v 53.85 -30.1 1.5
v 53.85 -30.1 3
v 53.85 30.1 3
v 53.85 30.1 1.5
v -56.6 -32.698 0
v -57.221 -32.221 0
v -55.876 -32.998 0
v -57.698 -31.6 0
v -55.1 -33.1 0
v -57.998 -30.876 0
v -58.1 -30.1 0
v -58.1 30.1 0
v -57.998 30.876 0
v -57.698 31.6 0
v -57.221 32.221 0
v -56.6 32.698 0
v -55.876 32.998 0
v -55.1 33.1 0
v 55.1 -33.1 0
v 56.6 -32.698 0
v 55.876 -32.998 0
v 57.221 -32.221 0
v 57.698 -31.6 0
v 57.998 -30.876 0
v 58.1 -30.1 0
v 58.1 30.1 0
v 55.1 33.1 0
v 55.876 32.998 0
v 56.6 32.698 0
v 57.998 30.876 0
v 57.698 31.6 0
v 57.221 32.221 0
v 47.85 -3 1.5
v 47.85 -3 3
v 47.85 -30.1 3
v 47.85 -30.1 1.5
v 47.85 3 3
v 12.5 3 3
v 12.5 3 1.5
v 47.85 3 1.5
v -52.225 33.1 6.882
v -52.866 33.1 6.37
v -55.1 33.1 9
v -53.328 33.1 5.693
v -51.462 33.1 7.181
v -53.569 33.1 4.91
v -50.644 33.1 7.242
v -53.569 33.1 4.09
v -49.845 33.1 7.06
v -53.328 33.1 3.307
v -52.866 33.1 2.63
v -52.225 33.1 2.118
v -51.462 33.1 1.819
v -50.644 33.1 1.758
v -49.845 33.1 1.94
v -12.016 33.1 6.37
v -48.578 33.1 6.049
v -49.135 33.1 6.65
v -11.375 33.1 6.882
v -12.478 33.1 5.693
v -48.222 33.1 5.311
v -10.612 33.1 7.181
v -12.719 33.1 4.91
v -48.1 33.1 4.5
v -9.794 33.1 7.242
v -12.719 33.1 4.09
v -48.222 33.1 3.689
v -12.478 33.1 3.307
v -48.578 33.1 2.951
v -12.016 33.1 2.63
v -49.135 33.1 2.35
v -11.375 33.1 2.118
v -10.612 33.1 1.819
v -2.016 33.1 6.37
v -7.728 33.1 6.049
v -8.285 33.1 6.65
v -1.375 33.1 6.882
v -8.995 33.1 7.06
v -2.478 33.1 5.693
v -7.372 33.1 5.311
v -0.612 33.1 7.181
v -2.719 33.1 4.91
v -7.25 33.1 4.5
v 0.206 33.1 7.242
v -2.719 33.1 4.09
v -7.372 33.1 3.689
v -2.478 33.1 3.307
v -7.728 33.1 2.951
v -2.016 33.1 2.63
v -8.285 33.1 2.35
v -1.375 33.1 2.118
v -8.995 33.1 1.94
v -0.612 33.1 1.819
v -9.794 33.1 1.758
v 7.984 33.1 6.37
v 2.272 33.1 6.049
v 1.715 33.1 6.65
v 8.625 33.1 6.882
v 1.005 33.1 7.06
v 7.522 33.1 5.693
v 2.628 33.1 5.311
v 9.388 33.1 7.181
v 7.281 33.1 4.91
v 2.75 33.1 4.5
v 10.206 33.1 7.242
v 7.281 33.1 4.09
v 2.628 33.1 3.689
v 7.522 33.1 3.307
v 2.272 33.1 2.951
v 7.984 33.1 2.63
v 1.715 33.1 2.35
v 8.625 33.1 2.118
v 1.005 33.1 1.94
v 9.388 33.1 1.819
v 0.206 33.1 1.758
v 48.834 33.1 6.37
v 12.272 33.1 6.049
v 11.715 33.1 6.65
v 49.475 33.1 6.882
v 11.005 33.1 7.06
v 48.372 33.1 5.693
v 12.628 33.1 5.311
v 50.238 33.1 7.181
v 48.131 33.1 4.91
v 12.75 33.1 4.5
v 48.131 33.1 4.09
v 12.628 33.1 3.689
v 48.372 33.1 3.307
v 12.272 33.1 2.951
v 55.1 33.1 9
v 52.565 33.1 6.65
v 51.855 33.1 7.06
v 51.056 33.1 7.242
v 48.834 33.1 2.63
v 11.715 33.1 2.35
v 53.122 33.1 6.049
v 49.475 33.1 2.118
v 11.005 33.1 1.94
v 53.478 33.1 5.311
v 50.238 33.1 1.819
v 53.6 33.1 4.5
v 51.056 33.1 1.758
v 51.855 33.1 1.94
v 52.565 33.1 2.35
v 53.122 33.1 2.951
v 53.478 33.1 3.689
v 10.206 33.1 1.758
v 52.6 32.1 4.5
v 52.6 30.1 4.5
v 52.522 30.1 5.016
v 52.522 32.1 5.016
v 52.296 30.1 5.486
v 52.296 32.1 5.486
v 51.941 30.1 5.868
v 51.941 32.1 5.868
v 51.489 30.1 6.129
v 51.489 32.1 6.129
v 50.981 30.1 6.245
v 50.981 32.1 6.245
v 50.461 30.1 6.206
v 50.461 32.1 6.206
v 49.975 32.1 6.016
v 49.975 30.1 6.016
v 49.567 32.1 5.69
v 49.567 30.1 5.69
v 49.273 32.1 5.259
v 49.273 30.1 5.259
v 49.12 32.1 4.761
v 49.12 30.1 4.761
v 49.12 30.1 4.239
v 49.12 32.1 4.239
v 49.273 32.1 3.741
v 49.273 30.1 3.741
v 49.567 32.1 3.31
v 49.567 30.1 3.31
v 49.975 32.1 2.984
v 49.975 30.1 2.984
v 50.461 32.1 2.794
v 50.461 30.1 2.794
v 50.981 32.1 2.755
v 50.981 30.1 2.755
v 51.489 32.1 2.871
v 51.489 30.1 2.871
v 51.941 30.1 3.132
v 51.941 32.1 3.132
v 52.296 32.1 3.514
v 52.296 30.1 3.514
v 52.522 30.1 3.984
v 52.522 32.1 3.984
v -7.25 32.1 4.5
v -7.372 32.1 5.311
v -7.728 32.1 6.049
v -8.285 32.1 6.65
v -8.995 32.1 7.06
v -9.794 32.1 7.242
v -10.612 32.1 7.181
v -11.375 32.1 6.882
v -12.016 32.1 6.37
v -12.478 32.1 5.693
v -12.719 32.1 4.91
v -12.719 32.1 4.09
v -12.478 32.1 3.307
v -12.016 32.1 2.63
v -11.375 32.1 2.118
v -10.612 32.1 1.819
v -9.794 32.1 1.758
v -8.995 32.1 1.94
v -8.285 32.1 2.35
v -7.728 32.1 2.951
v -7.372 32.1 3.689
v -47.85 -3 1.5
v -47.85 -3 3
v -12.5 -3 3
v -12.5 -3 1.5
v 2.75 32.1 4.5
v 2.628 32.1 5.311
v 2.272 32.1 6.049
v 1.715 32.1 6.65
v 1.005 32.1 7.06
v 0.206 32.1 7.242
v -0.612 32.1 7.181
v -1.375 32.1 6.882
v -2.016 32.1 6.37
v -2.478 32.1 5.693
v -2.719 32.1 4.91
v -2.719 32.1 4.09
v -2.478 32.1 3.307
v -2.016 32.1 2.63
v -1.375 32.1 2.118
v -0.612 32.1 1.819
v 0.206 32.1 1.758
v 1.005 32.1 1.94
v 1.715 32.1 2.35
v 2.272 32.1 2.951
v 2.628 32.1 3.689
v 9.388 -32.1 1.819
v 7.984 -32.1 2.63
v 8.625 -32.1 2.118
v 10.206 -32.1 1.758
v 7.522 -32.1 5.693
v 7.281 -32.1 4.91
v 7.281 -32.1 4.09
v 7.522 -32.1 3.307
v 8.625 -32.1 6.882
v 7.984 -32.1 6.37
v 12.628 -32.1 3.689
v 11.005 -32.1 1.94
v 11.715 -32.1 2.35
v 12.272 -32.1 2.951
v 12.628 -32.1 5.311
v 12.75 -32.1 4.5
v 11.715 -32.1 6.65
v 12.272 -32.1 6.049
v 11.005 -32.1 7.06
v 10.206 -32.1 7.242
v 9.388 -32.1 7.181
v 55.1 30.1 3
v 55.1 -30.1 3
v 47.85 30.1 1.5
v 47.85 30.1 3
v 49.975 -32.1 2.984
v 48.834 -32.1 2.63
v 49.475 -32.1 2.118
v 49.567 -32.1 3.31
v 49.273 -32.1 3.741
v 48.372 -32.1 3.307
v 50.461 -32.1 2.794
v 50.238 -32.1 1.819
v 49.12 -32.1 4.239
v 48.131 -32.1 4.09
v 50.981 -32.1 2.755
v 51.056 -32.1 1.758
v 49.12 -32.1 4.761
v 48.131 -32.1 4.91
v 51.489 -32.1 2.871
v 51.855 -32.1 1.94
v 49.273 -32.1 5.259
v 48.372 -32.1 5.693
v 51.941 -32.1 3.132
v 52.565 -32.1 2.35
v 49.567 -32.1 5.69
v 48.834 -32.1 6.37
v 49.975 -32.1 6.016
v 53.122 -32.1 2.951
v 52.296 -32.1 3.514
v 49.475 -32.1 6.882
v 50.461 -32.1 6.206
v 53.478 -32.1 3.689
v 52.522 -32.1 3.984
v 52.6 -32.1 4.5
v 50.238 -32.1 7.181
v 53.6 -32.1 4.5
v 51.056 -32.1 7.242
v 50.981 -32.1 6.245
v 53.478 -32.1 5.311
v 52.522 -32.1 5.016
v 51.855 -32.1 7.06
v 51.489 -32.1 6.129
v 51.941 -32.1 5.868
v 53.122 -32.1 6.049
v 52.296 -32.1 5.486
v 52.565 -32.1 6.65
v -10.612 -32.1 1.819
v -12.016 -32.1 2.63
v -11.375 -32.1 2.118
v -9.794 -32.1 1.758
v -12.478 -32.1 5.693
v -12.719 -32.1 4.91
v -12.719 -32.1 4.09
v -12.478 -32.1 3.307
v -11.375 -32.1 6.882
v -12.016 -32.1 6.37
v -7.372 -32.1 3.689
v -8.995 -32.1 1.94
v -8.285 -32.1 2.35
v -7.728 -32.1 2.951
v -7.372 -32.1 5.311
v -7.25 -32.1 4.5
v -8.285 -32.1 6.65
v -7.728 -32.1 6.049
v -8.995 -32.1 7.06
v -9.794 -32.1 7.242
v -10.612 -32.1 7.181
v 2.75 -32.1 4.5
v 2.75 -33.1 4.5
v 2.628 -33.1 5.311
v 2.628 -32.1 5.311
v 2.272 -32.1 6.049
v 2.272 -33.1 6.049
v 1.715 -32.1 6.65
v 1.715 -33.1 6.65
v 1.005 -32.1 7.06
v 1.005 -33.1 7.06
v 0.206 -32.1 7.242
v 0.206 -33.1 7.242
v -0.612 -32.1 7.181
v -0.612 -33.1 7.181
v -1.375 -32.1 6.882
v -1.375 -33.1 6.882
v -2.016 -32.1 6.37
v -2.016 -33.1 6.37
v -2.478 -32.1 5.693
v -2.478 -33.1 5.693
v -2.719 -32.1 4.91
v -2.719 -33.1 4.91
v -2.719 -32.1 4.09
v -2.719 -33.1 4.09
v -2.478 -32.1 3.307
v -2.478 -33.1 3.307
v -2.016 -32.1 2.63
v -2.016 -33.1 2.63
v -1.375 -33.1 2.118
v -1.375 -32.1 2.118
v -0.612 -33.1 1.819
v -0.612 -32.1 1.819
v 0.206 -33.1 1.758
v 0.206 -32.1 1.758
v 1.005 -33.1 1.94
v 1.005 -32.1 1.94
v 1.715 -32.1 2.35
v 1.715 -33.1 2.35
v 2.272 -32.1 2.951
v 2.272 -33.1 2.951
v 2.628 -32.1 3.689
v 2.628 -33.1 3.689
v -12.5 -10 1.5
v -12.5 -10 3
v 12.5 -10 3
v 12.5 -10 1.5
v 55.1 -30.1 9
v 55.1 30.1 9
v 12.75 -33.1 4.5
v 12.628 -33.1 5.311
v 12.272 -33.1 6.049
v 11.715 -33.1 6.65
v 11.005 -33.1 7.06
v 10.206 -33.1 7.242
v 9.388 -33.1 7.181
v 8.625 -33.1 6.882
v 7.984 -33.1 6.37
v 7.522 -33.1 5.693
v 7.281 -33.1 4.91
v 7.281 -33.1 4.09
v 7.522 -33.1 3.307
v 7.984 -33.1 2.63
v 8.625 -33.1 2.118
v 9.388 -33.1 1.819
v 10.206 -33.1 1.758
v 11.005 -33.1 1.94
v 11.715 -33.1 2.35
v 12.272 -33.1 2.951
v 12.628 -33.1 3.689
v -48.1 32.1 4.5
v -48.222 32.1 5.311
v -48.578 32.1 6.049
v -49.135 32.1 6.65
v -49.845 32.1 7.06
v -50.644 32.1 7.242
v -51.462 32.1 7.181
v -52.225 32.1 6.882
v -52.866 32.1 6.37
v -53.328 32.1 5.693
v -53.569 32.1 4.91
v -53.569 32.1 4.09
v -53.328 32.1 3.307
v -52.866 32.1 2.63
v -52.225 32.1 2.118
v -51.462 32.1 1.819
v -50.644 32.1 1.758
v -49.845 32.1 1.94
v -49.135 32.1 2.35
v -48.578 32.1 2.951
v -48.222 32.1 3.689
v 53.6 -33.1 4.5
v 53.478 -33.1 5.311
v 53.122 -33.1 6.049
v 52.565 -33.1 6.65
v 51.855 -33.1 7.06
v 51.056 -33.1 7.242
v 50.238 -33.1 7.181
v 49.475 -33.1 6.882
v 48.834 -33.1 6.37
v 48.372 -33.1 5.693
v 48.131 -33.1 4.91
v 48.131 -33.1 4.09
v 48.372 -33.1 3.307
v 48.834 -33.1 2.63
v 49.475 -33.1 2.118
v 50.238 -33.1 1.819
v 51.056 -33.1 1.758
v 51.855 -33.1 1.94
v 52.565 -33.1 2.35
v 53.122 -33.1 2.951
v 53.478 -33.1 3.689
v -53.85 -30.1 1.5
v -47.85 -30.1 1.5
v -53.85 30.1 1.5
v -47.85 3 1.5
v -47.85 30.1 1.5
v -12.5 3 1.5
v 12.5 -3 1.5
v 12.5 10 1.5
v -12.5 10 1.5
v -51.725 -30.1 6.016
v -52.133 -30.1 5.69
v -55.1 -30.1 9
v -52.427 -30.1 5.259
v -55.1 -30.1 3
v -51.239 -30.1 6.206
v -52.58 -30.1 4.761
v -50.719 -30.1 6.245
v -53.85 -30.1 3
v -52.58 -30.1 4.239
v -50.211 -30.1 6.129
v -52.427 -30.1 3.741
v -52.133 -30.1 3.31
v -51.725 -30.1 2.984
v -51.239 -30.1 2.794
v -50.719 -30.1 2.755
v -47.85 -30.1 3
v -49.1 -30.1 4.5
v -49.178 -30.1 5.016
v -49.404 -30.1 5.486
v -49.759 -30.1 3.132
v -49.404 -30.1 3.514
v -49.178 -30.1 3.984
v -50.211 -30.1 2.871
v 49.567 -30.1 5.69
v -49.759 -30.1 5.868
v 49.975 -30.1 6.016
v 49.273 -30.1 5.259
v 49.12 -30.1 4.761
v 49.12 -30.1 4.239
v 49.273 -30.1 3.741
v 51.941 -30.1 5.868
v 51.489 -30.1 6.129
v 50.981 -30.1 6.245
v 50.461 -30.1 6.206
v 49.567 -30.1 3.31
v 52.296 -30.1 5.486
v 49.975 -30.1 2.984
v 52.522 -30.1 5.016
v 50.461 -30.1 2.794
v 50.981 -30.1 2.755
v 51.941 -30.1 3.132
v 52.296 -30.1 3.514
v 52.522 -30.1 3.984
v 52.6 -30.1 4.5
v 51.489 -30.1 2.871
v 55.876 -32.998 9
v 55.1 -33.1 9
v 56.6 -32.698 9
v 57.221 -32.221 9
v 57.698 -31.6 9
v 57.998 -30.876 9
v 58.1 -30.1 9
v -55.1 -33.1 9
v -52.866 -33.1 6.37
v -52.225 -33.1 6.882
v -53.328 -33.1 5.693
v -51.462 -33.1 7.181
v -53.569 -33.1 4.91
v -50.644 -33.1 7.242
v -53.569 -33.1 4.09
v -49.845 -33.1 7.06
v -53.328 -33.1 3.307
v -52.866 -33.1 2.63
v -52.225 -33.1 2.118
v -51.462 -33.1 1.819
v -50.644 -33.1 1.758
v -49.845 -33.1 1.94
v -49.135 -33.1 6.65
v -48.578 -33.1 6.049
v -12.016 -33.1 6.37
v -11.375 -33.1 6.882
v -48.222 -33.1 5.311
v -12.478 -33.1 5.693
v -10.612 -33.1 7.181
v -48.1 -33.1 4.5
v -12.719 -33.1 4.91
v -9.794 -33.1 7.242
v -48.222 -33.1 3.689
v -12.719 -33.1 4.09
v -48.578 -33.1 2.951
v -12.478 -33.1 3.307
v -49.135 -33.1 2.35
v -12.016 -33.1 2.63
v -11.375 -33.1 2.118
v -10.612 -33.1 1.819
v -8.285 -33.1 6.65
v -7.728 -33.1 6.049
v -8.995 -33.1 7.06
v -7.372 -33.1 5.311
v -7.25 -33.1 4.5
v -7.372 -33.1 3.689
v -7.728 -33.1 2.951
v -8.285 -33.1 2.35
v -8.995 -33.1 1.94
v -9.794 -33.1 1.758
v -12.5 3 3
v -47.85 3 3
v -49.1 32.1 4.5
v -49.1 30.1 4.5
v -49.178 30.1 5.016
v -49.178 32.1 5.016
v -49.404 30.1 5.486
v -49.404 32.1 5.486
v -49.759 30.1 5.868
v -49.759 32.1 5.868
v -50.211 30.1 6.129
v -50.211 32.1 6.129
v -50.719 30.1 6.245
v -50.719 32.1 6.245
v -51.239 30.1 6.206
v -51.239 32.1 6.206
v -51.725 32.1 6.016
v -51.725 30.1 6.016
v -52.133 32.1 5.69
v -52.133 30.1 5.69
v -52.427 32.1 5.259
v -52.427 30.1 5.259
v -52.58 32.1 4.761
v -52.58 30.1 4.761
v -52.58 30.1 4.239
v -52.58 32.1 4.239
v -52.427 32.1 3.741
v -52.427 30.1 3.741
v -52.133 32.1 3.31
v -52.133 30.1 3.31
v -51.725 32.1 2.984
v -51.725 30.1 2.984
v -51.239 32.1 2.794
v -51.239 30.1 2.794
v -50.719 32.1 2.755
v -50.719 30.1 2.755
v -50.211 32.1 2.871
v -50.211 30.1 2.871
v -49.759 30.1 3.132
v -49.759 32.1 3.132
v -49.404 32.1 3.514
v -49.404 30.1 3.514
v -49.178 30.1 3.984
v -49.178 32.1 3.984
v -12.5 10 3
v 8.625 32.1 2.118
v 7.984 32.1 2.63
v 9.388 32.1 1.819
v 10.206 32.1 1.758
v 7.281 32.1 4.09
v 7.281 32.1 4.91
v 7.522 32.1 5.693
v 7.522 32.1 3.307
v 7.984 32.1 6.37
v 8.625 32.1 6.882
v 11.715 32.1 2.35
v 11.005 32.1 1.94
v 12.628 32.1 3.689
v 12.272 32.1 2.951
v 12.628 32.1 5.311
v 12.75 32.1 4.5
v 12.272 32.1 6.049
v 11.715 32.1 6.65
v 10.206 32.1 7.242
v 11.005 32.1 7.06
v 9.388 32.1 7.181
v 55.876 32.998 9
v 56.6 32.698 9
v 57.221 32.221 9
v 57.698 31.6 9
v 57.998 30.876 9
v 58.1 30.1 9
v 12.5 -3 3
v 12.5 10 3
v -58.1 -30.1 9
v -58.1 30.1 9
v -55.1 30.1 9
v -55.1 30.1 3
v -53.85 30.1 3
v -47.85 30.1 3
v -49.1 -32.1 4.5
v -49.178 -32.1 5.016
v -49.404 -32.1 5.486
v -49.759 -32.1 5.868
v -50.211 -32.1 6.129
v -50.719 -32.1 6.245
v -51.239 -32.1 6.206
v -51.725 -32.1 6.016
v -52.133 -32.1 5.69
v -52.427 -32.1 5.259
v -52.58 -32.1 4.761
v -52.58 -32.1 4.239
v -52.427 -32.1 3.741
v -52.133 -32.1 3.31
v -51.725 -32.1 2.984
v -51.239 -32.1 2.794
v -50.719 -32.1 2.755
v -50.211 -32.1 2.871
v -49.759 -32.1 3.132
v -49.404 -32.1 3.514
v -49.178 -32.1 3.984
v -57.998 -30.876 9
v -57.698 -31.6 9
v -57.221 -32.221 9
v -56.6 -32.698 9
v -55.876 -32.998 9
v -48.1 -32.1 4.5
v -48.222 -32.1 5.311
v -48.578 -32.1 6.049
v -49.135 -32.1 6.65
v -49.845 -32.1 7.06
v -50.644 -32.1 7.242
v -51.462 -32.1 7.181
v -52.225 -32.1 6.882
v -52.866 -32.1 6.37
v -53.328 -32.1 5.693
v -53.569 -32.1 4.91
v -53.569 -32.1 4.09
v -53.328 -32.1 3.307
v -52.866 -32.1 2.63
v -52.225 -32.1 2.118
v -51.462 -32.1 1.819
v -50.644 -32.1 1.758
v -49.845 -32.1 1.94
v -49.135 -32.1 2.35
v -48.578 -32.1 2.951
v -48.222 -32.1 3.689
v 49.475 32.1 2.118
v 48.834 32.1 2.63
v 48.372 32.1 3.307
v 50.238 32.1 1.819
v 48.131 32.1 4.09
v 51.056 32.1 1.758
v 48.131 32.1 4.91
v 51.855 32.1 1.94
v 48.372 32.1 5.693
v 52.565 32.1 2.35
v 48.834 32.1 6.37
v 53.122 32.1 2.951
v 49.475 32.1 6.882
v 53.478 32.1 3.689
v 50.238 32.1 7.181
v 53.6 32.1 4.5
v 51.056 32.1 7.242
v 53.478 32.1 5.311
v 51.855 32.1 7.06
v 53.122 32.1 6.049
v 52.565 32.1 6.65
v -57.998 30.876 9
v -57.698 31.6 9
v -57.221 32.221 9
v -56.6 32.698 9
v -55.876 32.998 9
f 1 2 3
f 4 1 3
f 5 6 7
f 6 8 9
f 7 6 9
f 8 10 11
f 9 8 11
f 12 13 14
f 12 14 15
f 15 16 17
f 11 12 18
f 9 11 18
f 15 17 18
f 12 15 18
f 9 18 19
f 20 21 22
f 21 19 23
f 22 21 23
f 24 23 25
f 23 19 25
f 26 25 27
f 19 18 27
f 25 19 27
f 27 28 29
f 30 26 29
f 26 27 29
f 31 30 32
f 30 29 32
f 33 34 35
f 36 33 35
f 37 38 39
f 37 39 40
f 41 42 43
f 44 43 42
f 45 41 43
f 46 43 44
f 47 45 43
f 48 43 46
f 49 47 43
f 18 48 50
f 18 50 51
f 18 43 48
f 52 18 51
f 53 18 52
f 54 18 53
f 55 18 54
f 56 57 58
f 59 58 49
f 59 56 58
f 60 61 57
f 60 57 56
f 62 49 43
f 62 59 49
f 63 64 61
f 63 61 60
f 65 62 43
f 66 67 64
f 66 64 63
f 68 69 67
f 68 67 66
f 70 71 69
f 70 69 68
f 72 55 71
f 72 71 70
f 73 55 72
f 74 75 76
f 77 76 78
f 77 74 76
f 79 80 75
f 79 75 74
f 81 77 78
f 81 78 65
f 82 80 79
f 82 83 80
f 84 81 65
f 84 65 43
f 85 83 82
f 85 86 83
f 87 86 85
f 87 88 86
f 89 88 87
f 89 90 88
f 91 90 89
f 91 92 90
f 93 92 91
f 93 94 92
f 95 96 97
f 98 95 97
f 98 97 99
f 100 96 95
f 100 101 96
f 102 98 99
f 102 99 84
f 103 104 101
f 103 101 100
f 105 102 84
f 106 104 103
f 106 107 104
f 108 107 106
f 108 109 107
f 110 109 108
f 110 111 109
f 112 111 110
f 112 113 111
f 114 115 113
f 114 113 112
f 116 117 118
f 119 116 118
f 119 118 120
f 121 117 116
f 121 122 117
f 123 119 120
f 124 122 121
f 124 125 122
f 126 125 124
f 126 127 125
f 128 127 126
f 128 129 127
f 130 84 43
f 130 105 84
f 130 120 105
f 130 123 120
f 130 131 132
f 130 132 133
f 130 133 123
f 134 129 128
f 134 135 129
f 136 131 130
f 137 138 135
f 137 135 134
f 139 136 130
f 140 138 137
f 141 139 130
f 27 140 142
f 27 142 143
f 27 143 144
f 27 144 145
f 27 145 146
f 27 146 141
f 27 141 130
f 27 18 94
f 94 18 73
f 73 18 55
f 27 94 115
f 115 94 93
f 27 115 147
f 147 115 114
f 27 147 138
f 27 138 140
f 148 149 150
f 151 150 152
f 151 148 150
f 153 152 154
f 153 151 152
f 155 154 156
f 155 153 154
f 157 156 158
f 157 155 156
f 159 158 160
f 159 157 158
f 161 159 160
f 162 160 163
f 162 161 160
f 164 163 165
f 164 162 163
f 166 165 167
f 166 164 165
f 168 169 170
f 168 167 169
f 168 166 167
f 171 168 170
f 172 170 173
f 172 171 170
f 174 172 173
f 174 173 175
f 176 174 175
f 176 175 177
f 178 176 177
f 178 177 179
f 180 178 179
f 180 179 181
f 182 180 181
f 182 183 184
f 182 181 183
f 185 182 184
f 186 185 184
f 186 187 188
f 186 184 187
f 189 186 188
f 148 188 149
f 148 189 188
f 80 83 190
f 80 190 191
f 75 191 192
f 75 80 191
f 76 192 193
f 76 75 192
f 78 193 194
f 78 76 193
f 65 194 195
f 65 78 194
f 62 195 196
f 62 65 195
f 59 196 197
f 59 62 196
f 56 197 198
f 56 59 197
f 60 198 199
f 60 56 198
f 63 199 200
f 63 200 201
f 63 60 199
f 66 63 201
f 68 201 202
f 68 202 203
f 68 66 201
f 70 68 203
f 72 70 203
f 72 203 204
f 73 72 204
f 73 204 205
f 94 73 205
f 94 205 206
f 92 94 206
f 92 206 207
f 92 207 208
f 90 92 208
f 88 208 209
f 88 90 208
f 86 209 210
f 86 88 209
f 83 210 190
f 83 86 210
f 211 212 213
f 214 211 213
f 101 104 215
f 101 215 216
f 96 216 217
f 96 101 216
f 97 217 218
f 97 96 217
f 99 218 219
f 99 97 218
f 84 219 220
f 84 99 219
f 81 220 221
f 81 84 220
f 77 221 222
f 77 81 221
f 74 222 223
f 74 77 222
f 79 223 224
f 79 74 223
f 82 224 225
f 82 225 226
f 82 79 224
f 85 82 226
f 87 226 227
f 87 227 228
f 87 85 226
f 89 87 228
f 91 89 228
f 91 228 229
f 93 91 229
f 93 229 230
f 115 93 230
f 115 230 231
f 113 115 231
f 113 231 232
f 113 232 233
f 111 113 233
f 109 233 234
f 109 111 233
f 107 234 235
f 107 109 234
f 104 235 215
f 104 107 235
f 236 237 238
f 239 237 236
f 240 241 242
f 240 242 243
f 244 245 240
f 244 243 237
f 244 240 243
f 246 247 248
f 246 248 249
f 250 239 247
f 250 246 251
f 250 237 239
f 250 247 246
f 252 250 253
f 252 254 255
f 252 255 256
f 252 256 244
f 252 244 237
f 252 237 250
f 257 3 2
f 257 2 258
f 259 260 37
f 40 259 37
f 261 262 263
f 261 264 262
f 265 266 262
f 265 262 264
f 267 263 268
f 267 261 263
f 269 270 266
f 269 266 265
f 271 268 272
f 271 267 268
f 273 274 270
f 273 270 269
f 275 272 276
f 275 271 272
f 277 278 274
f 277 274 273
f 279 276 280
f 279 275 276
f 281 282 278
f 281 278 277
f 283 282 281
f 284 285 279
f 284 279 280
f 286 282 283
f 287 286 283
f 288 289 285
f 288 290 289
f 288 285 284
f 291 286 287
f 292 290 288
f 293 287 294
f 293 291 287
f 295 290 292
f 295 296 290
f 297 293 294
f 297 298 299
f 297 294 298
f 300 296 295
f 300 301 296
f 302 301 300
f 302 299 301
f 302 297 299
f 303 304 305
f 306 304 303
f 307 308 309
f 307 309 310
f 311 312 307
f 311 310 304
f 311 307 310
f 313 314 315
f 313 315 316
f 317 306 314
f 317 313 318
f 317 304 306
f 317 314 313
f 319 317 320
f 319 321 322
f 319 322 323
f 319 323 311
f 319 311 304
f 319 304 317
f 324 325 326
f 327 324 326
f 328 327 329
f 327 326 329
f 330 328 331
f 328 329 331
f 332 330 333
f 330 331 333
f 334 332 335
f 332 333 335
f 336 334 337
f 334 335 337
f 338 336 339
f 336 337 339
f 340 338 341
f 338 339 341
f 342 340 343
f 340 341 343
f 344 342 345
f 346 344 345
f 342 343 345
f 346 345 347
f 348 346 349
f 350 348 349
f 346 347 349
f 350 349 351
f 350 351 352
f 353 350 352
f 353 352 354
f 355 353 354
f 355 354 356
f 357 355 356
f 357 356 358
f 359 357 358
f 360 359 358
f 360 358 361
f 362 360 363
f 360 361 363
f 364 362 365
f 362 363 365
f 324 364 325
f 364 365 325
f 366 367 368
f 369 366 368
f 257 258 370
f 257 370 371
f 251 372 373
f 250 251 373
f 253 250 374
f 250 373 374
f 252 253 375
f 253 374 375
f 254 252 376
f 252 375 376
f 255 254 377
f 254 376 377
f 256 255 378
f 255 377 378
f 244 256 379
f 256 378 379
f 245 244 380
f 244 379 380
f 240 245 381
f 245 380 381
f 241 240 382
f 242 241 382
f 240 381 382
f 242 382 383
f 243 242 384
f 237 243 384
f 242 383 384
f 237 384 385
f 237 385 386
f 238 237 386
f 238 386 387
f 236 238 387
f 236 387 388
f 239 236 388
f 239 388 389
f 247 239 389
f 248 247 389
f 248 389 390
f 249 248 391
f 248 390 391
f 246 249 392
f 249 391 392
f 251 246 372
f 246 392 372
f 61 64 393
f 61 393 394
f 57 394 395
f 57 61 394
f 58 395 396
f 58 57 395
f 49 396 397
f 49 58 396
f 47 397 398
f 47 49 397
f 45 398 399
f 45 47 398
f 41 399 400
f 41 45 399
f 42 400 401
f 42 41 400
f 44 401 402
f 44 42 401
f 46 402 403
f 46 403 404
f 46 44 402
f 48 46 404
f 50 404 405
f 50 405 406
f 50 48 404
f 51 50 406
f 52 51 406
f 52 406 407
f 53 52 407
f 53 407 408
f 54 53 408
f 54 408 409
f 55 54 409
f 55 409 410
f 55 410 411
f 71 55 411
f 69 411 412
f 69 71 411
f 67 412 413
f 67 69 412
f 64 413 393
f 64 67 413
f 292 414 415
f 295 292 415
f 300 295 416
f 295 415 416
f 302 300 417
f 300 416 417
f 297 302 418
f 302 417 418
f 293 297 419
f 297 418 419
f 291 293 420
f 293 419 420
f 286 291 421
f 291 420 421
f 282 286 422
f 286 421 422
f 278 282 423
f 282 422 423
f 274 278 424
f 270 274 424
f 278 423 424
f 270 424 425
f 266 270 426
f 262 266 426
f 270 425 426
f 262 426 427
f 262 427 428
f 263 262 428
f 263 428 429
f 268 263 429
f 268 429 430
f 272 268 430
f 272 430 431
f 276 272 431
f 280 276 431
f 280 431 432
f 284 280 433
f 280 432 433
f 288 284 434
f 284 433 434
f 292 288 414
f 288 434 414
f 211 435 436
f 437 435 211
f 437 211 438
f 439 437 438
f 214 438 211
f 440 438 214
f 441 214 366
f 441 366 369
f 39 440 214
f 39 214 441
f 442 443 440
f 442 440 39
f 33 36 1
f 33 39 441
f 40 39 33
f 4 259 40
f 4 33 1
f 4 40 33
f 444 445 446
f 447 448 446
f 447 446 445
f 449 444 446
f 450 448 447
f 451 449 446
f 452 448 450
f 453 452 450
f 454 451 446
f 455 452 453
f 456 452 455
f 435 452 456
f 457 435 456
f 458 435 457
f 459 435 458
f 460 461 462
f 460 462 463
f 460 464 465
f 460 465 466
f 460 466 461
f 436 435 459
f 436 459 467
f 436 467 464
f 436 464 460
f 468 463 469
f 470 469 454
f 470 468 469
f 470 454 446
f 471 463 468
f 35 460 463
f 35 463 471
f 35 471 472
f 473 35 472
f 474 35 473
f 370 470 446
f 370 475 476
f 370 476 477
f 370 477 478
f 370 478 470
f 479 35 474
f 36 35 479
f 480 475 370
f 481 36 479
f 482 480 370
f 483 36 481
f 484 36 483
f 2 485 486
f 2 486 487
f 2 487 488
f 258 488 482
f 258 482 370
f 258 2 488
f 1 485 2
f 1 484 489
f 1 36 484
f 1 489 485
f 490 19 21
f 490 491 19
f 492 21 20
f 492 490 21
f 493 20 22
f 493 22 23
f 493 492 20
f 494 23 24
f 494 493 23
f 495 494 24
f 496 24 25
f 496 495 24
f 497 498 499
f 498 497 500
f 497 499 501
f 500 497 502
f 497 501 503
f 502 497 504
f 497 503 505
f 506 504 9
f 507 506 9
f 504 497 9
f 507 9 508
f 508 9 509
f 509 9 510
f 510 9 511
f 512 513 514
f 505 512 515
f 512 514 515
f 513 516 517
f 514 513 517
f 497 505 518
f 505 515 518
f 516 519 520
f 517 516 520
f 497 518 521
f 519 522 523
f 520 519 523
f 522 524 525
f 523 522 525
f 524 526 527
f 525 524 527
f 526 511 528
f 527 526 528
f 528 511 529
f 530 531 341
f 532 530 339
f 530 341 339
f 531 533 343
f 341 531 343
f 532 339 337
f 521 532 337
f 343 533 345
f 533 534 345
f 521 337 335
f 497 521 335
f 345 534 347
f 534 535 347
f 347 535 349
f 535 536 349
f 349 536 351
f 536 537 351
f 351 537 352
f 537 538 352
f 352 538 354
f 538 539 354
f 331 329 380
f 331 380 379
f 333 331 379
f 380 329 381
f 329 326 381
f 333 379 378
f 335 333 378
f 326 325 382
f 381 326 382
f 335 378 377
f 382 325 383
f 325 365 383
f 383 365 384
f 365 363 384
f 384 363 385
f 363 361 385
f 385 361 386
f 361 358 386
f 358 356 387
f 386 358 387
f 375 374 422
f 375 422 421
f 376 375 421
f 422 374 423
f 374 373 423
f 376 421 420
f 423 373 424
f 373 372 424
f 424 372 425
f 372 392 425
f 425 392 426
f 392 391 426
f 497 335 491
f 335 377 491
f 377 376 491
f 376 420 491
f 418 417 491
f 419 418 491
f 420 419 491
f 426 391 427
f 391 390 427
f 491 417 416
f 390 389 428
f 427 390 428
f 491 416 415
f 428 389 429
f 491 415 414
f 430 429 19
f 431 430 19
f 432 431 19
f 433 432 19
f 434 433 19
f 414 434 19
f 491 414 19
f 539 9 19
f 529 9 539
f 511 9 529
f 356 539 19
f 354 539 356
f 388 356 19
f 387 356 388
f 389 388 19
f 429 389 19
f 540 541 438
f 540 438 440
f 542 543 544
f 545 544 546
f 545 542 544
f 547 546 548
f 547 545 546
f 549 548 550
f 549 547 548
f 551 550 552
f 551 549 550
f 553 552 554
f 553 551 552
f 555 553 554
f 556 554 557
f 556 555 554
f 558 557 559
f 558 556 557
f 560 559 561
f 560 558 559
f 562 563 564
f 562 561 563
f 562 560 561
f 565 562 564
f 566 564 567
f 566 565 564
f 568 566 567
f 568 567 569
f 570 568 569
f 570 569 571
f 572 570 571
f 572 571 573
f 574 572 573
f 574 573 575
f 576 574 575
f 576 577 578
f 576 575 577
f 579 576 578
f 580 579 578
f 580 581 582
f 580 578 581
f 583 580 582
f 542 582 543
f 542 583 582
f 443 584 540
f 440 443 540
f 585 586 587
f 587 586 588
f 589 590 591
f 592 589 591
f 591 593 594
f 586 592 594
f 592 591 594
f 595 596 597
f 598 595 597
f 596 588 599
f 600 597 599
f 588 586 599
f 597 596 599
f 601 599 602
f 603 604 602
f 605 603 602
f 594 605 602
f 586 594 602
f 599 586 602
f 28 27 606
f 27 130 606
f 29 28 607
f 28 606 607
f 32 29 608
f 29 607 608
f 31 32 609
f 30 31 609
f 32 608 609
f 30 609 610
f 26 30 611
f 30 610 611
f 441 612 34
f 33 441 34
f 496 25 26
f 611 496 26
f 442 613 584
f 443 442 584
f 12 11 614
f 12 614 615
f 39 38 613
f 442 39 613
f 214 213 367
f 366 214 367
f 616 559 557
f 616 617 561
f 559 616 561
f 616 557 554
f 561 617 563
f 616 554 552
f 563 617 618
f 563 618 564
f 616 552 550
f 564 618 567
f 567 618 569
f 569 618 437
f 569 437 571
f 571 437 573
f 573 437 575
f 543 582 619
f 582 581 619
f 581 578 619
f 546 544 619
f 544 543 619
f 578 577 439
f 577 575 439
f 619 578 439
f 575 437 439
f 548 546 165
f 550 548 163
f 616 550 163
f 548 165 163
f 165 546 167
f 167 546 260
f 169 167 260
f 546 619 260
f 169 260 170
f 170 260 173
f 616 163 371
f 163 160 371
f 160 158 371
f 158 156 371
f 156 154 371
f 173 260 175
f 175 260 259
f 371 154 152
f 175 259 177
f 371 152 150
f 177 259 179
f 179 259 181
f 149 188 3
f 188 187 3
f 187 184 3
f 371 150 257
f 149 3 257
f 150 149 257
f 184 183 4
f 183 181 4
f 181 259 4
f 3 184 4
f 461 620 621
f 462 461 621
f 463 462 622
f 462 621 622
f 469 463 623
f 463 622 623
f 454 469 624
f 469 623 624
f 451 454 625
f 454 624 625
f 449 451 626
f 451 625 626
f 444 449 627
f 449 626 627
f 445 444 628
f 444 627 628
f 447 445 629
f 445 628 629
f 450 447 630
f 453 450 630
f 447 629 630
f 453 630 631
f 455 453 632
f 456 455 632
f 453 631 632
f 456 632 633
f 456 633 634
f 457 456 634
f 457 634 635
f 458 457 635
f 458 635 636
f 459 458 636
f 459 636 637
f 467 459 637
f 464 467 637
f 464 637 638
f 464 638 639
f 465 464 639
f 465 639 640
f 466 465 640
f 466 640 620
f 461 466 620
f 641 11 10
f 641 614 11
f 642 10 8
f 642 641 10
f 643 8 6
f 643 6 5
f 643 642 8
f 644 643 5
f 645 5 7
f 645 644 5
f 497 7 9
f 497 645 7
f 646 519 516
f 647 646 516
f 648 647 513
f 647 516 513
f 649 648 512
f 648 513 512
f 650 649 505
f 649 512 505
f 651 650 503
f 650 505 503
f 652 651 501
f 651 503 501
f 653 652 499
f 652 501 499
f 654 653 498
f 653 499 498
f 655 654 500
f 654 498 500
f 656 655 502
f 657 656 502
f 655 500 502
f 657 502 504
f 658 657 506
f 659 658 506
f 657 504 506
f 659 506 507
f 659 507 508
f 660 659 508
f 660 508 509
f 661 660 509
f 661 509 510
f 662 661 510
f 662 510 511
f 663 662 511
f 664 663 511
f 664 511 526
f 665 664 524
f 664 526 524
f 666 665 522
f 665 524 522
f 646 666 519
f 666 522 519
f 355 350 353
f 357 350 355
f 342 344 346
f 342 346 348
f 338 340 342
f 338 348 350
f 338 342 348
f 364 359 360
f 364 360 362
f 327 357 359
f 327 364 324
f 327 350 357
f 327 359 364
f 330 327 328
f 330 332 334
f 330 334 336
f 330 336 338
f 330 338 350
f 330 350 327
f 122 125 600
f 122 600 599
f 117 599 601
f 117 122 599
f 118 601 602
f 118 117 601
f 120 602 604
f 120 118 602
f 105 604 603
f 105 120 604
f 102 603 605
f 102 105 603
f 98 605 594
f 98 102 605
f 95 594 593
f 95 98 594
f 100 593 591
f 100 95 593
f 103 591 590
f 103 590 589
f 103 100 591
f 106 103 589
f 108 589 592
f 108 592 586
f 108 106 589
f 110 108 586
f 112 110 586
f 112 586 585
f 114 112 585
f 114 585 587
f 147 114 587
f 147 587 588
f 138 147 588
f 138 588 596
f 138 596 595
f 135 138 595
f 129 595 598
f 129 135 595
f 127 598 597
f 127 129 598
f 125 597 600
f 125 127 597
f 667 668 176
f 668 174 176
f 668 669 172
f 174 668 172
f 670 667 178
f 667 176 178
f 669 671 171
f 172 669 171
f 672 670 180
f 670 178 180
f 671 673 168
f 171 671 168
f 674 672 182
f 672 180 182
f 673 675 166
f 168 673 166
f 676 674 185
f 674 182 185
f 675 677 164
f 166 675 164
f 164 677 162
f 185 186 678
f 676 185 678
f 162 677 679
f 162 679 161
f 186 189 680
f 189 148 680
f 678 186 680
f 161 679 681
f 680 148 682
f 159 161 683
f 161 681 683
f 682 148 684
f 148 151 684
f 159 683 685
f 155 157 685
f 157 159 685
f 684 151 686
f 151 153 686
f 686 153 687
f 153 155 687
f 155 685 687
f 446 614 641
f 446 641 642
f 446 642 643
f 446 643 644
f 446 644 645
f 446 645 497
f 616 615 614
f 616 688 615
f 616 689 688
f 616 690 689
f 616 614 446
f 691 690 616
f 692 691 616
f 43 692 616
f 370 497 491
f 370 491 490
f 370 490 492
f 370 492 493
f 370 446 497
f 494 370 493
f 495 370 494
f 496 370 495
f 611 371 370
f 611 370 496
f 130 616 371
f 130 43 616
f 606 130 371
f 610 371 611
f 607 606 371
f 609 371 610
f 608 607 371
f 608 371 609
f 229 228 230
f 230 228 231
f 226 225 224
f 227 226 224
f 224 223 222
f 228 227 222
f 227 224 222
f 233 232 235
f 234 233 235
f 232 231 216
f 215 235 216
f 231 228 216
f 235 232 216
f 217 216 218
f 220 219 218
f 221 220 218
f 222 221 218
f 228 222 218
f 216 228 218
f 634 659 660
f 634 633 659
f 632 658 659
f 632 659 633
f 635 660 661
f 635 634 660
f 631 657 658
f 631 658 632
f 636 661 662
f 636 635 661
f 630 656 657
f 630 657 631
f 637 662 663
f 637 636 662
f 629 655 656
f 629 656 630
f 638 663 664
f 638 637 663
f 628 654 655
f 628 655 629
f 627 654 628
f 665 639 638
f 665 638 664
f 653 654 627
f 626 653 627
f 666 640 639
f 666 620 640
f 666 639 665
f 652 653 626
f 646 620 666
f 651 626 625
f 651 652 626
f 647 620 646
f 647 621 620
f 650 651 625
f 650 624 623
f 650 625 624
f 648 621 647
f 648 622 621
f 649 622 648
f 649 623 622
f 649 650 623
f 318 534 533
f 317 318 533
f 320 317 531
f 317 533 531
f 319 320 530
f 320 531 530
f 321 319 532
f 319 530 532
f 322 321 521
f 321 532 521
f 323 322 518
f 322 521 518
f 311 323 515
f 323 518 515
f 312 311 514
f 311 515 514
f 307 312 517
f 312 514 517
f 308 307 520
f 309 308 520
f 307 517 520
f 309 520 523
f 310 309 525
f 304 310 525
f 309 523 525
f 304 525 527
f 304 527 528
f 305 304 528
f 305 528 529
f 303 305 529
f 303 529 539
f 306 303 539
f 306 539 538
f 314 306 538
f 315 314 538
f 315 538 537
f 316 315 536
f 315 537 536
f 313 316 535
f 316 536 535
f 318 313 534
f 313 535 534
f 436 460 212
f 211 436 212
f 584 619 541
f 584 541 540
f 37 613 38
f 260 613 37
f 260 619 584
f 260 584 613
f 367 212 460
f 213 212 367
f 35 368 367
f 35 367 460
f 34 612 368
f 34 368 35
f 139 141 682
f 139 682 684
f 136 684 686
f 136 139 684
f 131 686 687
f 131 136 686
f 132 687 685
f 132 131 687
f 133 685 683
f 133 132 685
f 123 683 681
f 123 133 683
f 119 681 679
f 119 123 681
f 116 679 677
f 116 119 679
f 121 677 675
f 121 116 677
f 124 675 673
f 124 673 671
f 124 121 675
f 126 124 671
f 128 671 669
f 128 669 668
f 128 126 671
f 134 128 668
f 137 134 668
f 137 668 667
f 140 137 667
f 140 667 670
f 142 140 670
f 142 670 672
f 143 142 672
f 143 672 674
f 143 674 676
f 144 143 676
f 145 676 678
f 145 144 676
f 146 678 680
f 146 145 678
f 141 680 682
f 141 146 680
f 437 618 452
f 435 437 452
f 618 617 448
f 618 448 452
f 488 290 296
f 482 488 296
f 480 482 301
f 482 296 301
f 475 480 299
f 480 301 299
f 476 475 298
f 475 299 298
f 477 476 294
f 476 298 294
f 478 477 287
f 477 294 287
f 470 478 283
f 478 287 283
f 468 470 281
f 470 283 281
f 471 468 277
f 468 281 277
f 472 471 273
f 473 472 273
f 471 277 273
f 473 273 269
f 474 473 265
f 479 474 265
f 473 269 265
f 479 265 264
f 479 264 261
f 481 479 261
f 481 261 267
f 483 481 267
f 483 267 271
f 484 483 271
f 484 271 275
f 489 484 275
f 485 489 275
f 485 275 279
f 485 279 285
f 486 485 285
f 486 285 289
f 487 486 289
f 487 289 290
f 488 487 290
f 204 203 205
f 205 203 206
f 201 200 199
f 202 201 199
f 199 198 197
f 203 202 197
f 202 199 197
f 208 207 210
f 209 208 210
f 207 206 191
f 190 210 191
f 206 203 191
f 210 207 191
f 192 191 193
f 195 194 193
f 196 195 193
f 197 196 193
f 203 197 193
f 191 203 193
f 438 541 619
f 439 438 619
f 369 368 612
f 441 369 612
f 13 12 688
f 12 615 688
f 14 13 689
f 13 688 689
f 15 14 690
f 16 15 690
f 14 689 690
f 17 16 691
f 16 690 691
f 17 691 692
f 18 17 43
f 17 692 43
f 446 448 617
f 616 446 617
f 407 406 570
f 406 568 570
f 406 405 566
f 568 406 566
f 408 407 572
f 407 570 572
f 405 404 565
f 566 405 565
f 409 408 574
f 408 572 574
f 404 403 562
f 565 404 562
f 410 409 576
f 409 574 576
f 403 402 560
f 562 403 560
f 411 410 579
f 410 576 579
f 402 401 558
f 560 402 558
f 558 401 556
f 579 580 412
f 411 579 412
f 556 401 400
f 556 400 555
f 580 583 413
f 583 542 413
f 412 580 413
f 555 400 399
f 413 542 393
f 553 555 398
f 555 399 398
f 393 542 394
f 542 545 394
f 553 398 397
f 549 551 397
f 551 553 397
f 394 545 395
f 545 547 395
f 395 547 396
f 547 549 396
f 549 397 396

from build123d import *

# Parameters (mm, degrees)
F0_W     = 110.2
F0_H     = 60.2
F1_DEPTH = 3
F0_W_2   = 116.2
F0_H_2   = 66.2
F2_DEPTH = 9
F3_W     = 35.35
F3_H     = 6
F4_DEPTH = 1.5
F5_R     = 1.75
F6_DEPTH = 25
F5_R_2   = 2.75
F7_DEPTH = 1
F8_R     = 3


# Not quite as in the source:
# - a pattern or mirror of a feature is missing from the dataset's text; its kind, count and spacing are read off the source's solid


with BuildPart() as f1:
    # F0 (on Top) → F1 (new body)
    with BuildSketch(Plane.XY):
        Rectangle(F0_W, F0_H)
    extrude(amount=F1_DEPTH)

    # F0 (on Top) → F2 (join)
    with BuildSketch(Plane.XY):
        Rectangle(F0_W_2, F0_H_2)
        Rectangle(F0_W, F0_H, mode=Mode.SUBTRACT)
    extrude(amount=F2_DEPTH)

    # F3 (on face) → F4 (cut)
    with BuildSketch(Plane.XY.offset(3)):
        Polygon((-12.5, 10), (-12.5, 3), (-12.5, -3), (-12.5, -10), (12.5, -10), (12.5, -3), (12.5, 3), (12.5, 10), align=None)
        with Locations((-30.175, 0)):
            Rectangle(F3_W, F3_H)
        with Locations((30.175, 0)):
            Rectangle(F3_W, F3_H)
        Polygon((-47.85, 30.1), (-53.85, 30.1), (-53.85, -30.1), (-47.85, -30.1), (-47.85, -3), (-47.85, 3), align=None)
        Polygon((53.85, 30.1), (47.85, 30.1), (47.85, 3), (47.85, -3), (47.85, -30.1), (53.85, -30.1), align=None)
    extrude(amount=-F4_DEPTH, mode=Mode.SUBTRACT)

    # F5 (on face) → F6 (cut)
    with BuildSketch(Plane.XZ.offset(33.1)):
        with Locations((-50.85, 4.5)):
            Circle(F5_R)
        with Locations((50.85, 4.5)):
            Circle(F5_R)
    f6 = extrude(amount=-F6_DEPTH, mode=Mode.SUBTRACT)

    # F6_copies: F6 across plane
    add(f6.mirror(Plane.ZX), mode=Mode.SUBTRACT)

    # F5 (on face) → F7 (cut)
    with BuildSketch(Plane.XZ.offset(33.1)):
        with Locations((-50.85, 4.5)):
            Circle(F5_R_2)
        with Locations((-50.85, 4.5)):
            Circle(F5_R, mode=Mode.SUBTRACT)
        with Locations((-10, 4.5)):
            Circle(F5_R_2)
        with Locations((0, 4.5)):
            Circle(F5_R_2)
        with Locations((10, 4.5)):
            Circle(F5_R_2)
        with Locations((50.85, 4.5)):
            Circle(F5_R_2)
        with Locations((50.85, 4.5)):
            Circle(F5_R, mode=Mode.SUBTRACT)
    f7 = extrude(amount=-F7_DEPTH, mode=Mode.SUBTRACT)

    # F7_copies: F7 across plane
    add(f7.mirror(Plane.ZX), mode=Mode.SUBTRACT)

    # F8
    f8_edges = [f1.edges().sort_by_distance(p)[0] for p in [
        (58.1, -33.1, 4.5),
        (-58.1, -33.1, 4.5),
        (58.1, 33.1, 4.5),
        (-58.1, 33.1, 4.5),
    ]]
    fillet(f8_edges, radius=F8_R)


solid = f1.part
